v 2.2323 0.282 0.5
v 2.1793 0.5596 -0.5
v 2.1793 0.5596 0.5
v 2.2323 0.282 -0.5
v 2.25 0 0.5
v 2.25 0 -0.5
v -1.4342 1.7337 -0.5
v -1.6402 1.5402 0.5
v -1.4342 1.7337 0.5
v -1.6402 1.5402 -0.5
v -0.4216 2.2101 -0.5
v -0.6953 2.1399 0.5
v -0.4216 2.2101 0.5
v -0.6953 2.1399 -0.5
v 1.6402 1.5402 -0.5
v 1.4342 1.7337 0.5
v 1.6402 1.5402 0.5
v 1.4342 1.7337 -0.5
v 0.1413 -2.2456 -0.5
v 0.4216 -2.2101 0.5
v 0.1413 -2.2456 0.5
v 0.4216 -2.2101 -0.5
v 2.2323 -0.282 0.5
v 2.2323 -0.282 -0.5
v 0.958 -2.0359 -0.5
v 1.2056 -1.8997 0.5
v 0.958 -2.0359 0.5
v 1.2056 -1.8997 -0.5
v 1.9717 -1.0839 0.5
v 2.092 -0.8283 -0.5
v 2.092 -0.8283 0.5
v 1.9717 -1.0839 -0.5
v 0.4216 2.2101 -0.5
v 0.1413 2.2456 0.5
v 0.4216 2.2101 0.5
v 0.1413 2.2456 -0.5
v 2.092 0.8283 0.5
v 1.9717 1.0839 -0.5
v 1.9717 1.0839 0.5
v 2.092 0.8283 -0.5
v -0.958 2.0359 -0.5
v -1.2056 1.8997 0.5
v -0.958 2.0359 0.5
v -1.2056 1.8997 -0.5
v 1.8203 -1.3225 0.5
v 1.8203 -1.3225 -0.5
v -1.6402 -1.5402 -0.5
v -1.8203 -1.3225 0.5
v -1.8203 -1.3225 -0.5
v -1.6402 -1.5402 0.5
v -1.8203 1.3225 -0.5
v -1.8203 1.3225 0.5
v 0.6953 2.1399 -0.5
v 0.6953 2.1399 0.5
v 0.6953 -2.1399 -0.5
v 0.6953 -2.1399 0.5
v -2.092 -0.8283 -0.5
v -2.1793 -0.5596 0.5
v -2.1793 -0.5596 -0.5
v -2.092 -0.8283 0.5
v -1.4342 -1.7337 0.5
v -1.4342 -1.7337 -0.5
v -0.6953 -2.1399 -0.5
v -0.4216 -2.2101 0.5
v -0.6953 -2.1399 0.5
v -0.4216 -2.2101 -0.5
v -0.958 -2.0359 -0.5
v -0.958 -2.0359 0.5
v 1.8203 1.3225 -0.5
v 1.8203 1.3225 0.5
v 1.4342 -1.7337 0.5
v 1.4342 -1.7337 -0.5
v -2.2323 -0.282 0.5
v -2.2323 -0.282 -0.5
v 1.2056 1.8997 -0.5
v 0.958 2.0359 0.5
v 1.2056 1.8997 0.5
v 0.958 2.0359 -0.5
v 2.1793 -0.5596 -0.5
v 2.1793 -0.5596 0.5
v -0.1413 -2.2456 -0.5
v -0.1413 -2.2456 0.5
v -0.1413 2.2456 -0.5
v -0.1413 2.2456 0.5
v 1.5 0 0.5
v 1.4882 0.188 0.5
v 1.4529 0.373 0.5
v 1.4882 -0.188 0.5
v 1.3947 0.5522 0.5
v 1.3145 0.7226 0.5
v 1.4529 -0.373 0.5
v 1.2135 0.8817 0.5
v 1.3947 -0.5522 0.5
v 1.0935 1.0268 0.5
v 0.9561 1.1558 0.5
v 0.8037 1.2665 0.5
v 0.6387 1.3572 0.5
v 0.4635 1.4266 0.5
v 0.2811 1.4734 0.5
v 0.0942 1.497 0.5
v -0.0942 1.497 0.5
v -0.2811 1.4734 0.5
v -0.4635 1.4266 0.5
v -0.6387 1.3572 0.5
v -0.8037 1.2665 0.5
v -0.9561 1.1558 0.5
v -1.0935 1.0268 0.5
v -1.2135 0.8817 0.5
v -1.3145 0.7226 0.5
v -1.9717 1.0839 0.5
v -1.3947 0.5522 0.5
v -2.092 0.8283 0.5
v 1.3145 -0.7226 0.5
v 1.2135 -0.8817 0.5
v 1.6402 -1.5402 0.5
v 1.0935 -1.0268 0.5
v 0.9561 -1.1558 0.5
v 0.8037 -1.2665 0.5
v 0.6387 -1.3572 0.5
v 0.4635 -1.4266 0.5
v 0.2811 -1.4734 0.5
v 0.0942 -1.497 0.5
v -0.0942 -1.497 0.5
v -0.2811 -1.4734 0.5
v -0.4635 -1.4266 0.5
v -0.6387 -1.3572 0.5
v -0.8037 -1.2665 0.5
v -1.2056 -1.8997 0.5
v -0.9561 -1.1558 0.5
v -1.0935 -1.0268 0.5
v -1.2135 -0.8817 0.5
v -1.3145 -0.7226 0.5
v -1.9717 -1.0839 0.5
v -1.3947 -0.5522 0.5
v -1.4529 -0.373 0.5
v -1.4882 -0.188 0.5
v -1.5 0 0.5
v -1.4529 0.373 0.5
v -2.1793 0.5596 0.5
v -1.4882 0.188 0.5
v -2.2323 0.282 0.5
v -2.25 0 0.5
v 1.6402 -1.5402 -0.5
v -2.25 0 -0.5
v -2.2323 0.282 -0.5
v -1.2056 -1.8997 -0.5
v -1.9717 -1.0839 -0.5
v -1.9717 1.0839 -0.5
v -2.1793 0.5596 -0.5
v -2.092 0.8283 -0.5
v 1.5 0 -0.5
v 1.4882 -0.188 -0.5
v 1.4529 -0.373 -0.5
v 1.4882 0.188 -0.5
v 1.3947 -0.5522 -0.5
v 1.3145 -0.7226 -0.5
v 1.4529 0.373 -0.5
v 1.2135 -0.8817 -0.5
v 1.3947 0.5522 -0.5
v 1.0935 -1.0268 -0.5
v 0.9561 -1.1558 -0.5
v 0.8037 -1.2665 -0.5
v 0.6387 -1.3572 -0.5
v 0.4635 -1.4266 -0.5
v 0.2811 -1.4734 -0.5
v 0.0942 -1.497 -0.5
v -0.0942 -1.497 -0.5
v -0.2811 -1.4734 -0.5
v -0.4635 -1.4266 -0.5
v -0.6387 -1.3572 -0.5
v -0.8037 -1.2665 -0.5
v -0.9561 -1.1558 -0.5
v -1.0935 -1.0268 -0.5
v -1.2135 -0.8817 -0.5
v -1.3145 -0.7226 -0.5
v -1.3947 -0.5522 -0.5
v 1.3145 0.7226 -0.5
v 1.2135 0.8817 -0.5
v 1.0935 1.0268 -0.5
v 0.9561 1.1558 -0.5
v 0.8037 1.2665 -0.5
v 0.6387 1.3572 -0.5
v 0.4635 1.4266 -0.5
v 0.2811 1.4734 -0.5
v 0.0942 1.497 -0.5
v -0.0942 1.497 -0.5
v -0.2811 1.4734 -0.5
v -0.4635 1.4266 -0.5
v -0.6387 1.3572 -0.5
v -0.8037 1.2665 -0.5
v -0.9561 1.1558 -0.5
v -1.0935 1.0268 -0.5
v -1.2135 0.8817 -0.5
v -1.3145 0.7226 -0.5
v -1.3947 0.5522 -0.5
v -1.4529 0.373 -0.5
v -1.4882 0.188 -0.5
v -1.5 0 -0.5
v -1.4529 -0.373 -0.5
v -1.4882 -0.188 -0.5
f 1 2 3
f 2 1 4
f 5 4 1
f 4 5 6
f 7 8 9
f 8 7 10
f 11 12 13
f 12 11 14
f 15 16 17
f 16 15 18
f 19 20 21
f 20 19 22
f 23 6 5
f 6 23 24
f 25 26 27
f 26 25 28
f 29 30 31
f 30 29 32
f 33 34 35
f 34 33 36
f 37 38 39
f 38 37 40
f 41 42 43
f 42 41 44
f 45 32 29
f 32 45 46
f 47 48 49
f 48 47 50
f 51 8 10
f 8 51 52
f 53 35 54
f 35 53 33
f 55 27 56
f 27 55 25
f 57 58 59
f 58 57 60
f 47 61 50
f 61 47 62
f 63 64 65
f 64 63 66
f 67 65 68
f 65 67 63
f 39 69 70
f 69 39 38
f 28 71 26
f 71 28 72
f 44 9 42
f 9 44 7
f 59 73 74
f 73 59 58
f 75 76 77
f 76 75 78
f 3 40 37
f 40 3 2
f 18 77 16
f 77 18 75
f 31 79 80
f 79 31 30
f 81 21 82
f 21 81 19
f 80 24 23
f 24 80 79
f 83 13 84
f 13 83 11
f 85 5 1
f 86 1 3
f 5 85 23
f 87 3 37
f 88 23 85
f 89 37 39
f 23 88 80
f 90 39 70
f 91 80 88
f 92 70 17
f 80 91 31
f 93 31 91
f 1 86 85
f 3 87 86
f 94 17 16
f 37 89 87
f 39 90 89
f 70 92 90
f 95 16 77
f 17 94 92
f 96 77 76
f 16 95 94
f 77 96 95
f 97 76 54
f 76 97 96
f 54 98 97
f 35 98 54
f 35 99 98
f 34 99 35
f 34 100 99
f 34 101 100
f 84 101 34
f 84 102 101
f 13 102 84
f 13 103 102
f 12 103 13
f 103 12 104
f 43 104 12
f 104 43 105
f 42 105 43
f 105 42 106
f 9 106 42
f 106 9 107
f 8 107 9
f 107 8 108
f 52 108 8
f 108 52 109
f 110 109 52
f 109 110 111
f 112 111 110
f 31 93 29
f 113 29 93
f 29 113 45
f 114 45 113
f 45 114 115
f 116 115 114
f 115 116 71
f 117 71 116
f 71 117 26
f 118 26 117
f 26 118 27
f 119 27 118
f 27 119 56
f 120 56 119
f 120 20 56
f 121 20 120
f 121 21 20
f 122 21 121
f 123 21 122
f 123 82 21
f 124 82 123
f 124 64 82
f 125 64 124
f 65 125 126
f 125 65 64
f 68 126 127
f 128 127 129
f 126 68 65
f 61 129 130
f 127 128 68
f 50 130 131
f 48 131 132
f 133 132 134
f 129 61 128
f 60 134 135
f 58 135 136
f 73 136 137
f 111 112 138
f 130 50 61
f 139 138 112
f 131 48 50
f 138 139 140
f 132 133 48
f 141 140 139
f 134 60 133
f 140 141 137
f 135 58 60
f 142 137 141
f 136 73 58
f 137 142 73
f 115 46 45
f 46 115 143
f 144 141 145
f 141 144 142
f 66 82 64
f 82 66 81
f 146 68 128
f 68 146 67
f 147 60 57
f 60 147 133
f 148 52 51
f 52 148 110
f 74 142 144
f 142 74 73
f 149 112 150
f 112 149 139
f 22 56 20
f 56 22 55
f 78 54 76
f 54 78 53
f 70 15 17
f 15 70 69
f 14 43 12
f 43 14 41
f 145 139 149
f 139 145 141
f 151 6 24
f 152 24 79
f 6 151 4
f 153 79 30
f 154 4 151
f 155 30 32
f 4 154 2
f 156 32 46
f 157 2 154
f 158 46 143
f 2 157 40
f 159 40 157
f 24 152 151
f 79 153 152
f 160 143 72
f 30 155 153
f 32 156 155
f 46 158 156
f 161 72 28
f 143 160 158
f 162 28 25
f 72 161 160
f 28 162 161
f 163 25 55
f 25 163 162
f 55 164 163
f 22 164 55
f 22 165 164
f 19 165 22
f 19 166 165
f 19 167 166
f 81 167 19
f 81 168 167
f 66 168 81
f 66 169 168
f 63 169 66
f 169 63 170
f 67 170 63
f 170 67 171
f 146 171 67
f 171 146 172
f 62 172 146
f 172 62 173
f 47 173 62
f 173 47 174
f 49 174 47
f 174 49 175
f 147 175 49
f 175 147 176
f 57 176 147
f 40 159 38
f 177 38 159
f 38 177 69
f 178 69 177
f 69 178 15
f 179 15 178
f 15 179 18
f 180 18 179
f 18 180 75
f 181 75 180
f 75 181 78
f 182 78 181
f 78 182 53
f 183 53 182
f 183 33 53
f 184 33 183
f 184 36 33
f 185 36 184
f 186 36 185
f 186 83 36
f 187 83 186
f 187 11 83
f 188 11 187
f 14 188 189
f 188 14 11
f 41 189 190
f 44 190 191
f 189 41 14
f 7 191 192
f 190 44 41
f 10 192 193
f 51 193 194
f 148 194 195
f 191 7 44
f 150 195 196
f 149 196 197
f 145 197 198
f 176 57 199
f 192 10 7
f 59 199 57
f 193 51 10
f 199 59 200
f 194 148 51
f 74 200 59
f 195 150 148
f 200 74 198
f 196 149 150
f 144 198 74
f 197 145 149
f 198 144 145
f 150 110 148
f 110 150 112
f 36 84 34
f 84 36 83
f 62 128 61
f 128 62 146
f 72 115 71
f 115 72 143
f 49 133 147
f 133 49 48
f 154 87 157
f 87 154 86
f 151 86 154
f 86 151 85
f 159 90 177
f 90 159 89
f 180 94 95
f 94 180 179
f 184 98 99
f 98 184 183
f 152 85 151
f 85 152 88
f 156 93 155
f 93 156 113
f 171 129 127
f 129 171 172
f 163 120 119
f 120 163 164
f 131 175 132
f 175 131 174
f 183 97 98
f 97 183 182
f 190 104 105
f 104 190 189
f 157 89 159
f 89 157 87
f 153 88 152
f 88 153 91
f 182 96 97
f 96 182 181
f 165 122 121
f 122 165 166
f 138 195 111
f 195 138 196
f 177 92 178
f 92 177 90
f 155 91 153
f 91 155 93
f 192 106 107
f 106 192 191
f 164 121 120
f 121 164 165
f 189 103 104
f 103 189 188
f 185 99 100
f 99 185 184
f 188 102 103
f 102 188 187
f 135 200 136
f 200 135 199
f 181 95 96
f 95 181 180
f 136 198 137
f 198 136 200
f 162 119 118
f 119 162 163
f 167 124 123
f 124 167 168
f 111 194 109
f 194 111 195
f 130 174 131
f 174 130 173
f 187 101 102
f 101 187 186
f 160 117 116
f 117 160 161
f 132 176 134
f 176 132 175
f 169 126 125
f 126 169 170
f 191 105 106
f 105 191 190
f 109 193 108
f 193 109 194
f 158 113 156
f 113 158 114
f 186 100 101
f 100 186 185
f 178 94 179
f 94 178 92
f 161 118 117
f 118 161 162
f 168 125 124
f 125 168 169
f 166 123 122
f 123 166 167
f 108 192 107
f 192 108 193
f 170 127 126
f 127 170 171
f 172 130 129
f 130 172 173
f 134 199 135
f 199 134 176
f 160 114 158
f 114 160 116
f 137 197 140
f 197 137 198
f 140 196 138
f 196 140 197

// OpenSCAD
$fn = 50;


difference() {
	union() {
		translate(v = [0, 0, -0.5000000000]) {
			cylinder(h = 1, r = 2.2500000000);
		}
	}
	union() {
		translate(v = [0, 0, -100.0000000000]) {
			cylinder(h = 200, r = 1.5000000000);
		}
	}
}
